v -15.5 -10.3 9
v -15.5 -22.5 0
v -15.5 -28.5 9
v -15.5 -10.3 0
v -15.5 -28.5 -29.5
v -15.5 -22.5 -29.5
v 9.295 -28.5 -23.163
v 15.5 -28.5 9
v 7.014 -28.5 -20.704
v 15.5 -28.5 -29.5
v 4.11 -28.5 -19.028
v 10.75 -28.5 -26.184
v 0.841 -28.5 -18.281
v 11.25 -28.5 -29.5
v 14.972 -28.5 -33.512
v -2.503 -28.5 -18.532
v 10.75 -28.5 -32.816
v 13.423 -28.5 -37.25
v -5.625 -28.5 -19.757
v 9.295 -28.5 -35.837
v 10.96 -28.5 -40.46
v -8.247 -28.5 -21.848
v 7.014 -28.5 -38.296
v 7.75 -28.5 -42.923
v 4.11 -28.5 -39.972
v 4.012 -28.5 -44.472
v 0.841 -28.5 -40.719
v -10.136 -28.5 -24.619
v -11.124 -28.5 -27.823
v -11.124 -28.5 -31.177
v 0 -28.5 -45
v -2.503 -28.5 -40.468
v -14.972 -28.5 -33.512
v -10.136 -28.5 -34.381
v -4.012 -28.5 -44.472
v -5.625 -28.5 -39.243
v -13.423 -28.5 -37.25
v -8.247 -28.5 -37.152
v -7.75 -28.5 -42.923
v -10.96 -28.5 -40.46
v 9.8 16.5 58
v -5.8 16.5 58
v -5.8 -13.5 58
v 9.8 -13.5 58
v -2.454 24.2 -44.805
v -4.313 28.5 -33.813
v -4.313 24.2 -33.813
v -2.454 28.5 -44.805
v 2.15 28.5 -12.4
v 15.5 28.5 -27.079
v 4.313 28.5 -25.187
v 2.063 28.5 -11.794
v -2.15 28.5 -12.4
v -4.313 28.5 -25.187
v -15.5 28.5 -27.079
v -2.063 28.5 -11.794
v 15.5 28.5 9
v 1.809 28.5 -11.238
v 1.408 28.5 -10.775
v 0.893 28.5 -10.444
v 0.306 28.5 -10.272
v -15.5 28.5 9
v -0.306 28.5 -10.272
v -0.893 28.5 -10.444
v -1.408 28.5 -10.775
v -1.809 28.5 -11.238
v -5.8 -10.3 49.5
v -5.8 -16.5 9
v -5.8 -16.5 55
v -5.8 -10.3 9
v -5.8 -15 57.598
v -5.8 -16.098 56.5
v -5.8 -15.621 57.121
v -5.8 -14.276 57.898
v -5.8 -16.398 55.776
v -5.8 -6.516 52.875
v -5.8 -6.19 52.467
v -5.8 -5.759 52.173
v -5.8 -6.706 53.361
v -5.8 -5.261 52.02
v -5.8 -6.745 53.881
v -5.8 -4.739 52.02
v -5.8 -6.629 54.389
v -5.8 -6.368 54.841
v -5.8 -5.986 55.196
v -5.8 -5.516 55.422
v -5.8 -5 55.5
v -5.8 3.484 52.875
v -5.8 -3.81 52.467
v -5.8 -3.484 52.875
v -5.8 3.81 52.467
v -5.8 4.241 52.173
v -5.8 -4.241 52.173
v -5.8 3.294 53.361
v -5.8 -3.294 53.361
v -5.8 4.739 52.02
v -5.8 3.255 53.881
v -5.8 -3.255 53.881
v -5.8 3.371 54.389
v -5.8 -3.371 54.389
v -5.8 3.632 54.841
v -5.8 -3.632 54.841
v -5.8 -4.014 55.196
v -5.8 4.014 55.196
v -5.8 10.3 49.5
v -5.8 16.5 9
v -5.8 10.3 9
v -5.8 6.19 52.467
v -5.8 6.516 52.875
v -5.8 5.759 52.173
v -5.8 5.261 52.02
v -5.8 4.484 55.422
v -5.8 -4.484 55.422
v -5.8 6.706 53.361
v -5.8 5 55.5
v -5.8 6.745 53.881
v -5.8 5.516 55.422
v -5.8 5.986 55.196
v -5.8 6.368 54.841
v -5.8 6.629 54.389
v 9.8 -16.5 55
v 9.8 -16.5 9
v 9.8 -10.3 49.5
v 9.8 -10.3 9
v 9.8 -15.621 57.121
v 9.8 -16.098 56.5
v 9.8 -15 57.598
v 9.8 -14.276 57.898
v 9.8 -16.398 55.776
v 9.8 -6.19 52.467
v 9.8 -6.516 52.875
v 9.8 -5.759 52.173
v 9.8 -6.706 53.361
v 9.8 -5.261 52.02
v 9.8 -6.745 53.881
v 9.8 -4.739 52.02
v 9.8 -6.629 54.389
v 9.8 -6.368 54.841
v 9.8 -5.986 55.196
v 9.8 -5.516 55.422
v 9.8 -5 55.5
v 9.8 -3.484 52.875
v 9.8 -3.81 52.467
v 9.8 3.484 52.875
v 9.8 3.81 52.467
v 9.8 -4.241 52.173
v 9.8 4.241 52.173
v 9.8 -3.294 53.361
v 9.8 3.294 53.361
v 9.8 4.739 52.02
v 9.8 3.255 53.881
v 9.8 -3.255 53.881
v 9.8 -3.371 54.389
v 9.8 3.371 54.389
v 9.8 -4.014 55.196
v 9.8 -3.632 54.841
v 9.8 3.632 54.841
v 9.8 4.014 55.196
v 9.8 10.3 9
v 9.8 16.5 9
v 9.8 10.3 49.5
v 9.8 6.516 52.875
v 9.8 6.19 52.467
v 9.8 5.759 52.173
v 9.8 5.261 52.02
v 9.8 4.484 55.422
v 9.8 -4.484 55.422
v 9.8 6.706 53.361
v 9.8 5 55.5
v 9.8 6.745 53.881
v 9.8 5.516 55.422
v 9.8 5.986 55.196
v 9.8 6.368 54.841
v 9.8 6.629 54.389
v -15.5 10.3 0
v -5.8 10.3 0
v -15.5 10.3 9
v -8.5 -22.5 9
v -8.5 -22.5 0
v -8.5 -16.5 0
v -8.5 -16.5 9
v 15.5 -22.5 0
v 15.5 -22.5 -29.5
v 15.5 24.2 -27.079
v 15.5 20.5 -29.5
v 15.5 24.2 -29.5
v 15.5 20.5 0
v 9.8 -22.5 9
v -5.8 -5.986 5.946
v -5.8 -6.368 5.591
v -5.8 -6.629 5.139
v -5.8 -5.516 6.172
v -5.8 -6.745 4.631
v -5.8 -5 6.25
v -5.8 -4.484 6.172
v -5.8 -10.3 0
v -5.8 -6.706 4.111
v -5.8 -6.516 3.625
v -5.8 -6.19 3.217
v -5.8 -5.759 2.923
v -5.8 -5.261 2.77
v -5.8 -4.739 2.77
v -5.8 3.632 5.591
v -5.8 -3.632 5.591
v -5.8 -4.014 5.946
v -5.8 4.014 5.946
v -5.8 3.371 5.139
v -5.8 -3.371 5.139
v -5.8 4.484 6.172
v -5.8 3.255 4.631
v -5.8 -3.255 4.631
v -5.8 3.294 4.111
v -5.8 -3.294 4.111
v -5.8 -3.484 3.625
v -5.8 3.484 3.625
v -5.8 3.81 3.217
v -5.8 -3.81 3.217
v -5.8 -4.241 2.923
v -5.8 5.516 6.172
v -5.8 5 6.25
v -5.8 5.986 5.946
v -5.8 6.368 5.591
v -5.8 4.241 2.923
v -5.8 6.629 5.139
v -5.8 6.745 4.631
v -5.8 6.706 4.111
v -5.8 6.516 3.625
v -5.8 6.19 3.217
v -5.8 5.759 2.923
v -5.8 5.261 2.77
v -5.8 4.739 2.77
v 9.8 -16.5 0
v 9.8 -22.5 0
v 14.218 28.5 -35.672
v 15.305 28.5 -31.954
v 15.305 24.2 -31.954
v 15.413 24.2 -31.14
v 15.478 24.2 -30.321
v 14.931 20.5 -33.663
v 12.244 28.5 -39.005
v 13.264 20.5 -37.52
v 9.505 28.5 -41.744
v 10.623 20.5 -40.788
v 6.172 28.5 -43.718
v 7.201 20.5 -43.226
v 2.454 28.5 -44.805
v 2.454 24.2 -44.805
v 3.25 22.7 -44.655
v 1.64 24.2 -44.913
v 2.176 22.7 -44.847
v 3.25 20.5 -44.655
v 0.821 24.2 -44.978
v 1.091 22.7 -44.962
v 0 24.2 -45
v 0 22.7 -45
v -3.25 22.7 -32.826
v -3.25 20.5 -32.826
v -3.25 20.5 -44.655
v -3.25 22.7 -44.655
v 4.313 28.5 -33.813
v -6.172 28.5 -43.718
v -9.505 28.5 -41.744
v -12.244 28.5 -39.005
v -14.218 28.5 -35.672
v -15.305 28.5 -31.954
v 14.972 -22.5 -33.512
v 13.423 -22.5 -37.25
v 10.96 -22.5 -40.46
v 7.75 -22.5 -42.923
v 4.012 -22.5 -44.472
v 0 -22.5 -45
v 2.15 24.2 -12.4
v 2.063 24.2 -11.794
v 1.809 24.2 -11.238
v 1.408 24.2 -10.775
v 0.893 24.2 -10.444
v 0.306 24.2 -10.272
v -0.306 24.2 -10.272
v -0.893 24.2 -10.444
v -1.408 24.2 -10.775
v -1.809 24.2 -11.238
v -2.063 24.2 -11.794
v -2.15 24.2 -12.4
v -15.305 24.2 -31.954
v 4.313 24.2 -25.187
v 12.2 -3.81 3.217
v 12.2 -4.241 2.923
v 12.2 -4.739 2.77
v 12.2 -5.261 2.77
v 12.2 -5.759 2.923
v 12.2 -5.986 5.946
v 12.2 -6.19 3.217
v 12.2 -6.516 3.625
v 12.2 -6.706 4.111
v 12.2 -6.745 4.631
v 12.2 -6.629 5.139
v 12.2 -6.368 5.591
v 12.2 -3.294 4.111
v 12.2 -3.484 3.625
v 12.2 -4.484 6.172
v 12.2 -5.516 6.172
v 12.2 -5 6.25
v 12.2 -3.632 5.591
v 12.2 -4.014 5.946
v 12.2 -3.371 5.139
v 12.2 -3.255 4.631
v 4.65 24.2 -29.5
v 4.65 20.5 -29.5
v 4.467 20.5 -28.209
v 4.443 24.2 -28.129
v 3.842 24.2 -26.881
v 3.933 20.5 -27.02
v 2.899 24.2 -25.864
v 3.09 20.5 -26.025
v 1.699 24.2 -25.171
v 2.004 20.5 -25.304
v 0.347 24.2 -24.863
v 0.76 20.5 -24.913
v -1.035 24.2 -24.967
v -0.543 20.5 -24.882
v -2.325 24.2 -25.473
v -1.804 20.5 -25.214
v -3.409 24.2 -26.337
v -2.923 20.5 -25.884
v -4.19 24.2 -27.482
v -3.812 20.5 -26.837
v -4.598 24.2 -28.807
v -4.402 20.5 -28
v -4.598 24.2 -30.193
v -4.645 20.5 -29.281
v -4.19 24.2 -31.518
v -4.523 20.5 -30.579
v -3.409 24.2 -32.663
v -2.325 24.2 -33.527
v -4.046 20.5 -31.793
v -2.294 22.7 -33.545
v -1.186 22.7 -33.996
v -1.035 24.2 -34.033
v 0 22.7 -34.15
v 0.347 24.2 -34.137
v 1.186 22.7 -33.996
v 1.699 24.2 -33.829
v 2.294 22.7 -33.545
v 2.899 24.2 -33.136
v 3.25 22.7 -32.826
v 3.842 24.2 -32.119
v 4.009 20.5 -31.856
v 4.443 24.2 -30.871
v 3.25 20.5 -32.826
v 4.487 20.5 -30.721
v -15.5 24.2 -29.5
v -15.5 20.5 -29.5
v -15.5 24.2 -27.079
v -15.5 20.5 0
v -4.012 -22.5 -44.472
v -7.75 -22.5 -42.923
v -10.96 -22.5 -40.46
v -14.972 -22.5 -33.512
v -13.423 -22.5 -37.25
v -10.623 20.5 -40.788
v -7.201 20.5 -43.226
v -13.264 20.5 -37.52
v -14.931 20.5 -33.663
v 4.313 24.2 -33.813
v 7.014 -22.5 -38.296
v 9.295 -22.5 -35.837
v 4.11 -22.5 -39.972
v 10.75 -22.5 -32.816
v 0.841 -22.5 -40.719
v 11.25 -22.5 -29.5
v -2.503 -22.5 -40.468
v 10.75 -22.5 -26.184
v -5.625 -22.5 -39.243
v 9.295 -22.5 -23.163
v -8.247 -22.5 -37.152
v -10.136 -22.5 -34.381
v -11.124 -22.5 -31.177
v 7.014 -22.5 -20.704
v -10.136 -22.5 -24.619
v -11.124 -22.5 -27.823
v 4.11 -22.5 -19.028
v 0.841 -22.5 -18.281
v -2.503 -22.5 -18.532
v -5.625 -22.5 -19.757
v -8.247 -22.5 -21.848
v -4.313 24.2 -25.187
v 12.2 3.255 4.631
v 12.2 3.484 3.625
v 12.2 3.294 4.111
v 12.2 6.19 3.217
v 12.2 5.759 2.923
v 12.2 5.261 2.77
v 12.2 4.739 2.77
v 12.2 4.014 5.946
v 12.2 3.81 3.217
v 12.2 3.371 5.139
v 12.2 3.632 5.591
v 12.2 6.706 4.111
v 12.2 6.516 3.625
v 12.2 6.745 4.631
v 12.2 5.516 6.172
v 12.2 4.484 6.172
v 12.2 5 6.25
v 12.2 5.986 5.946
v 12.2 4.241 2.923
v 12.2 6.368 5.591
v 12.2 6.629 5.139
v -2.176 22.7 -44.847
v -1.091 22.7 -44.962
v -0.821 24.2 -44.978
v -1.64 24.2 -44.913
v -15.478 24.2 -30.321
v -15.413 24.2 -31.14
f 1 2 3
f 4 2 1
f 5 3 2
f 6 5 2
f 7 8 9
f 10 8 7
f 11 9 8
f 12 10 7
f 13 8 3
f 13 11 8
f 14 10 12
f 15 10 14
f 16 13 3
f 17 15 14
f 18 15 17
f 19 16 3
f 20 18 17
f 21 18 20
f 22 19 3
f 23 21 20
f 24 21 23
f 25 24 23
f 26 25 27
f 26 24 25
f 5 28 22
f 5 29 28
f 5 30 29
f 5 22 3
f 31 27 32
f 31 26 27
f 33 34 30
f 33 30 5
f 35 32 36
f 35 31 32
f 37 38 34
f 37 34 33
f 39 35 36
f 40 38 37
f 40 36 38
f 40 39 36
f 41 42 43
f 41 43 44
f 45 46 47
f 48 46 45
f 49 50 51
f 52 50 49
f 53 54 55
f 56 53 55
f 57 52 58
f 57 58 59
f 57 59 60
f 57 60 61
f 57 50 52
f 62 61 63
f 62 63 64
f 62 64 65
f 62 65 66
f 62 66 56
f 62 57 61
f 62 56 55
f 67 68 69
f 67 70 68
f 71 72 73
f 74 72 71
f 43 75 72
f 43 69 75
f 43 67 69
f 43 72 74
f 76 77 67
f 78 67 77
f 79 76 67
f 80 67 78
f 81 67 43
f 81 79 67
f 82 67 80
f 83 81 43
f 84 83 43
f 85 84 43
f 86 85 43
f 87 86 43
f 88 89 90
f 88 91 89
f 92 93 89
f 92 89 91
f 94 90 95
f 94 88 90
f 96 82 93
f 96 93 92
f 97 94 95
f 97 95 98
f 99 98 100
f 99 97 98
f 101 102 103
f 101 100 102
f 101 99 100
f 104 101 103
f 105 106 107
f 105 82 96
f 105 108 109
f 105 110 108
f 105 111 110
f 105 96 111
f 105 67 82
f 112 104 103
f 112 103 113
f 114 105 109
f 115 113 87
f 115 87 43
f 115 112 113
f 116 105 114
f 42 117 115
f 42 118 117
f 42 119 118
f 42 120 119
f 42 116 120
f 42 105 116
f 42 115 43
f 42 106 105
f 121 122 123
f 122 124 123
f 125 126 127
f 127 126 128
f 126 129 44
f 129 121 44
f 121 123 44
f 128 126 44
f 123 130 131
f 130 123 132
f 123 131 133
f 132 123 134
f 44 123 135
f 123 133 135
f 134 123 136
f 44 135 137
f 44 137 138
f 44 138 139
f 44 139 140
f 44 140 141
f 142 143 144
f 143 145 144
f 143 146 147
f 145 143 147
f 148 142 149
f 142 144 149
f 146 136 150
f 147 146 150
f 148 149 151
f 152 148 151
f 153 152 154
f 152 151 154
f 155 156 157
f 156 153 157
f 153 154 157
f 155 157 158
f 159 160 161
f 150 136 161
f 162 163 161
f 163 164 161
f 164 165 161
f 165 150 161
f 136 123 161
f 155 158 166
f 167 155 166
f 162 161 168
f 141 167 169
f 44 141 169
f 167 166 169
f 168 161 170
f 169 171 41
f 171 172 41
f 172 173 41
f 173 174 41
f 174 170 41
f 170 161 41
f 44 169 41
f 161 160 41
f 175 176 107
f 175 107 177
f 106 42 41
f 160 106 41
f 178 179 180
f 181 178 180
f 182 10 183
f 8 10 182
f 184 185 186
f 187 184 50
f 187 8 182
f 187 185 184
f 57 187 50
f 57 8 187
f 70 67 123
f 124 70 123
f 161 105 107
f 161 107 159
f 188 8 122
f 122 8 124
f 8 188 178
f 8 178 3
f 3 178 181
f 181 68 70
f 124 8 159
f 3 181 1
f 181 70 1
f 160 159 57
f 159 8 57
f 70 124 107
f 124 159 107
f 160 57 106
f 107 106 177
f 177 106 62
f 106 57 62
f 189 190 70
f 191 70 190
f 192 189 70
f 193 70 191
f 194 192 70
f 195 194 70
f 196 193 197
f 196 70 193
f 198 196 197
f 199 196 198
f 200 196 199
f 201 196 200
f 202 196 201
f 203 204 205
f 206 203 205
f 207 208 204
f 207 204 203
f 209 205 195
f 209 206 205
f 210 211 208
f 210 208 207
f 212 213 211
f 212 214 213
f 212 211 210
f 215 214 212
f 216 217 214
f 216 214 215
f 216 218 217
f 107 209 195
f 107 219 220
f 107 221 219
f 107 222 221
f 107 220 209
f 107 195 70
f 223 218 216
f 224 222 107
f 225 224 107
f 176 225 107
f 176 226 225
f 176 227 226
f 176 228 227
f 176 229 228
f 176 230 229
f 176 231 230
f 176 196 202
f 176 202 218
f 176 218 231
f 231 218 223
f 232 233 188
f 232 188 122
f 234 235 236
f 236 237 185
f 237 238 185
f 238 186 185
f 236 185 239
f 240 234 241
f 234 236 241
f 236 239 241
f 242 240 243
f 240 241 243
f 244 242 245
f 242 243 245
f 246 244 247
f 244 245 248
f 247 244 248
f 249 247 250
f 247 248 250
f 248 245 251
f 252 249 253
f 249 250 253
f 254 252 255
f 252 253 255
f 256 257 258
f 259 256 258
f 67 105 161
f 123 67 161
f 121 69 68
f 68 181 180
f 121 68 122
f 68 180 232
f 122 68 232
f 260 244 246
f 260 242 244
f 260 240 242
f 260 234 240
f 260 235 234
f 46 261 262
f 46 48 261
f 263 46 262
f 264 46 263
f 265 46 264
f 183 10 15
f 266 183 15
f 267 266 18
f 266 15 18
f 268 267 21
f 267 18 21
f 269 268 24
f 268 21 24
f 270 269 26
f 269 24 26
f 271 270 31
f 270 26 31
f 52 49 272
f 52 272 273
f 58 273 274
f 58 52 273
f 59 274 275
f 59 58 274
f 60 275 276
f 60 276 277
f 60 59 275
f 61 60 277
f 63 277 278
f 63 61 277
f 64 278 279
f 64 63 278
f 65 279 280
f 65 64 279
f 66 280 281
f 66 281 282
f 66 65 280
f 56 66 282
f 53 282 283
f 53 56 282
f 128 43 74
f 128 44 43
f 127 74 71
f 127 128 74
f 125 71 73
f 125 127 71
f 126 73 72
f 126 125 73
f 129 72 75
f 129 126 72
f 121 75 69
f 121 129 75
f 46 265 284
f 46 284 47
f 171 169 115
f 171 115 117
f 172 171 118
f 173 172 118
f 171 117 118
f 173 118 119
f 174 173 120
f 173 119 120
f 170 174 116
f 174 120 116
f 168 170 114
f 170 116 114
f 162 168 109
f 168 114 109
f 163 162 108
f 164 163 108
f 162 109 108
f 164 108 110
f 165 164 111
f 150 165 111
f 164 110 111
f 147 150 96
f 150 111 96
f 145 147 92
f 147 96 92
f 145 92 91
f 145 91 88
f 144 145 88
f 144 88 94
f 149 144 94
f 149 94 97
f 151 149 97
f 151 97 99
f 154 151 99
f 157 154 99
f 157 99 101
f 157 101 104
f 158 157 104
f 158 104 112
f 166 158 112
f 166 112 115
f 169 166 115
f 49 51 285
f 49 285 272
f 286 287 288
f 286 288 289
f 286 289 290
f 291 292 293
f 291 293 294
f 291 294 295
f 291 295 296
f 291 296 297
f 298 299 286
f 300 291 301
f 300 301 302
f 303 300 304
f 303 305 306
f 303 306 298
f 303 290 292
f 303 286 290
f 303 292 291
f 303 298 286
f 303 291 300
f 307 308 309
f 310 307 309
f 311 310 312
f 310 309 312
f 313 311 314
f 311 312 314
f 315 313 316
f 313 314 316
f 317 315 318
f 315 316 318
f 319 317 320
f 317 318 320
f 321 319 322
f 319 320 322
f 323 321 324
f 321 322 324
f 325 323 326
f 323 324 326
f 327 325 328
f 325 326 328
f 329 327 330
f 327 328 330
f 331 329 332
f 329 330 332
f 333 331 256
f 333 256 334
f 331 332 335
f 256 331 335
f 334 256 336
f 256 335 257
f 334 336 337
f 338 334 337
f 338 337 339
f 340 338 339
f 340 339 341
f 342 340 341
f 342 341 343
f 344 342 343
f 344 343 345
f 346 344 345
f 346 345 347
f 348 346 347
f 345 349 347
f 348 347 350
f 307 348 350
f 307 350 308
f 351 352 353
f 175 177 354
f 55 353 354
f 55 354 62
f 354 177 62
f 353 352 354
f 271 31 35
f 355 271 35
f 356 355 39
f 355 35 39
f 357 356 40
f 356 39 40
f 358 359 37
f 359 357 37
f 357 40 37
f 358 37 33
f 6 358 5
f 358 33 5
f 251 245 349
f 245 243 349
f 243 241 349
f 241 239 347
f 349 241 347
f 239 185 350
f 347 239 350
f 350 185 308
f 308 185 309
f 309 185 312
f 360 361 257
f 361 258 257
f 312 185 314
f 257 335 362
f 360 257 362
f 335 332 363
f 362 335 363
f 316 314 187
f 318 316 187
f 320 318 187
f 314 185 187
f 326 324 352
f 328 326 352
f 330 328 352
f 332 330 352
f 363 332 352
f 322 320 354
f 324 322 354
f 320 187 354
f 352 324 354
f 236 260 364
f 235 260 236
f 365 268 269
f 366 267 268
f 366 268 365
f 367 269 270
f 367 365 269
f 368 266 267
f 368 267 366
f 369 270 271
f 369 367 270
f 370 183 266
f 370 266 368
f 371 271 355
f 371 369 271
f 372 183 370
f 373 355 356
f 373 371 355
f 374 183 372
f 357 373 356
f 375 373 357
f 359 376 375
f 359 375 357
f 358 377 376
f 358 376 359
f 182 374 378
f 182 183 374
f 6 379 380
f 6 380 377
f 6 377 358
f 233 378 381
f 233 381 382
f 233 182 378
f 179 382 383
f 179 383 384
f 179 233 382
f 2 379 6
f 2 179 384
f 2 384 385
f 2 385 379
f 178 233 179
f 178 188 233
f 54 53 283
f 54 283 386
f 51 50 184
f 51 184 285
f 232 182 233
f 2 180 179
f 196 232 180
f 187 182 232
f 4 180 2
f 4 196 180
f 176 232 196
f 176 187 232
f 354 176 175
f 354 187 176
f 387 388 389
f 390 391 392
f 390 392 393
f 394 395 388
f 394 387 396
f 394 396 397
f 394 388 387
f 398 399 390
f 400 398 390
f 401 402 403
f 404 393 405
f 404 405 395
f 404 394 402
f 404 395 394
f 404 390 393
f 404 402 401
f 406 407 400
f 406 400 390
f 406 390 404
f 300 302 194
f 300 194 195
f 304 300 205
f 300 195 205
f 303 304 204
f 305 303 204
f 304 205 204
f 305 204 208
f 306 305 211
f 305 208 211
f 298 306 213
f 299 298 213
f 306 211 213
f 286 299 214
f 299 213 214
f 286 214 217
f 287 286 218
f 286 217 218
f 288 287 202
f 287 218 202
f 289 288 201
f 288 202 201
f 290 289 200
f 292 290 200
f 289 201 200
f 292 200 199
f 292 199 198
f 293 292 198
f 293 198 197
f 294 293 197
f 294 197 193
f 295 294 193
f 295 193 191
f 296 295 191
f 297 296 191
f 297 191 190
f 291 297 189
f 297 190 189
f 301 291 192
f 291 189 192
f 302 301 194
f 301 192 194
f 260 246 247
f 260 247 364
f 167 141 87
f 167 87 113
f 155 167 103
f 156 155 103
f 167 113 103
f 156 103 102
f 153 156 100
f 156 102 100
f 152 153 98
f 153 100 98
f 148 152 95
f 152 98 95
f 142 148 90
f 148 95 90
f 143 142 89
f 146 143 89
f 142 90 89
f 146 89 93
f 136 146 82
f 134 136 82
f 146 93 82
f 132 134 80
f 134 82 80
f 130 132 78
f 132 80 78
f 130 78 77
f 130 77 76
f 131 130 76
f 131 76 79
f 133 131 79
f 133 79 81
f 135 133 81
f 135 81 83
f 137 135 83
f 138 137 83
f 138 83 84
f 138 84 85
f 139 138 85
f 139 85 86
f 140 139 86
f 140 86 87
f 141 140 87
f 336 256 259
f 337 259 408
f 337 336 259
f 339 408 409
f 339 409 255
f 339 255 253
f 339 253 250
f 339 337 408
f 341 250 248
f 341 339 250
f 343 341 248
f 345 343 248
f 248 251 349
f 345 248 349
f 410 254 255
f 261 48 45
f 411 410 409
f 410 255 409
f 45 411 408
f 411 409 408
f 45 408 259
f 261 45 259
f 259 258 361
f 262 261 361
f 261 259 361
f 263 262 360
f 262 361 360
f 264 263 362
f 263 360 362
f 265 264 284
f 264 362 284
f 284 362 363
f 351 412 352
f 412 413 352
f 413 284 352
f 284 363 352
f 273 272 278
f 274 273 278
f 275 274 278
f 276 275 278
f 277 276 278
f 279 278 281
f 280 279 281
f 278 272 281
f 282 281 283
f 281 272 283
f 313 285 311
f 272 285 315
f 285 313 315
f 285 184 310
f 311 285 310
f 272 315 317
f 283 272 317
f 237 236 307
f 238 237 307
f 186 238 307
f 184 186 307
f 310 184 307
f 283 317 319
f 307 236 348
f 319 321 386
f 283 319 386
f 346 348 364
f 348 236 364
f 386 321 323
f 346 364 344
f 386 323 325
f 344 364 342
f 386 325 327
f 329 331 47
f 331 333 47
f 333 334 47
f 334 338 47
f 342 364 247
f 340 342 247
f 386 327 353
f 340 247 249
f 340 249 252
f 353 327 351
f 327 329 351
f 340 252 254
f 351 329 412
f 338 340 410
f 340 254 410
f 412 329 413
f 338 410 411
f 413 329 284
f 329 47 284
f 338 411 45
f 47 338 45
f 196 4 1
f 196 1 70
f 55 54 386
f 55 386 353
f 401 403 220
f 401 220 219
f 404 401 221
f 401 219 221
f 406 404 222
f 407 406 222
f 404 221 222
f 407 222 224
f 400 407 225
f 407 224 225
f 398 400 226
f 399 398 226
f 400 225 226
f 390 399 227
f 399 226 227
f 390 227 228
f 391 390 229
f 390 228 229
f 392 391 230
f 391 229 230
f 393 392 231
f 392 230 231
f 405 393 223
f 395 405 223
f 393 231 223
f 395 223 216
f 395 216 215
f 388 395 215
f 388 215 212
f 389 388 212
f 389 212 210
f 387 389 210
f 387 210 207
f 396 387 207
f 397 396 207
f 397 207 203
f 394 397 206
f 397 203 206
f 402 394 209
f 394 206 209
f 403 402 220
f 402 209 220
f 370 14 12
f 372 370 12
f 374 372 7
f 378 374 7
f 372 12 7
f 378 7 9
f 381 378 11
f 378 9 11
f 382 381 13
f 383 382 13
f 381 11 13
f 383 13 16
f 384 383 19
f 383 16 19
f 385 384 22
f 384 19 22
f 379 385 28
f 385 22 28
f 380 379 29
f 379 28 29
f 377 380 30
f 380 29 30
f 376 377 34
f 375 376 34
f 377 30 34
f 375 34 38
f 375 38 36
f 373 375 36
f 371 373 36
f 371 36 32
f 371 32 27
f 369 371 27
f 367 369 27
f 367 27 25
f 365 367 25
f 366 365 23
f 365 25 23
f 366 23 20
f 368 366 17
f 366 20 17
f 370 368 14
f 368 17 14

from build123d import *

# Parameters (mm, degrees)
SKETCH1_W           = 18.3
SKETCH1_H           = 6
BOSS_EXTRUDE1_DEPTH = 9
SKETCH2_W           = 15.6
SKETCH2_H           = 6.2
BOSS_EXTRUDE2_DEPTH = 49
SKETCH3_W           = 15.6
SKETCH3_H           = 8.5
BOSS_EXTRUDE3_DEPTH = 20.7
FILLET3_R           = 3
SKETCH4_W           = 31
SKETCH4_H           = 8
SKETCH4_H_2         = 6
BOSS_EXTRUDE4_DEPTH = 45
CUT_EXTRUDE1_DEPTH  = 58
SKETCH6_3_R         = 11.25
CUT_EXTRUDE2_DEPTH  = 6
CUT_EXTRUDE3_DEPTH  = 4.3
CUT_EXTRUDE4_DEPTH  = 2.2
SKETCH9_3_R         = 4.65
CUT_EXTRUDE5_DEPTH  = 8
SKETCH10_R          = 1.75
CUT_EXTRUDE6_DEPTH  = 18


with BuildPart() as part:
    # Sketch1 → Boss-Extrude1 (new body)
    with BuildSketch(Plane.XY):
        Polygon((15.5, -28.5), (-15.5, -28.5), (-15.5, -10.3), (-5.8, -10.3), (-5.8, 10.3), (-15.5, 10.3), (-15.5, 28.5), (15.5, 28.5), align=None)
        with Locations((0.65, -19.5)):
            Rectangle(SKETCH1_W, SKETCH1_H, mode=Mode.SUBTRACT)
    extrude(amount=BOSS_EXTRUDE1_DEPTH)

    # Sketch2 → Boss-Extrude2 (add)
    with BuildSketch(Plane.XY.offset(9)):
        with Locations((2, -13.4)):
            Rectangle(SKETCH2_W, SKETCH2_H)
        with Locations((2, 13.4)):
            Rectangle(SKETCH2_W, SKETCH2_H)
    extrude(amount=BOSS_EXTRUDE2_DEPTH)

    # Sketch3 → Boss-Extrude3 (add)
    with BuildSketch(Plane.XZ.offset(-10.3)):
        with Locations((2, 53.75)):
            Rectangle(SKETCH3_W, SKETCH3_H)
    extrude(amount=BOSS_EXTRUDE3_DEPTH)

    # Fillet3
    fillet3_edges = [part.edges().sort_by_distance(p)[0] for p in [
        (2, -16.5, 58),
    ]]
    fillet(fillet3_edges, radius=FILLET3_R)

    # Sketch4 → Boss-Extrude4 (add)
    with BuildSketch(Plane(origin=(0, 0, 0), x_dir=(-1, 0, 0), z_dir=(0, 0, -1))):
        with Locations((0, 24.5)):
            Rectangle(SKETCH4_W, SKETCH4_H)
        with Locations((0, -25.5)):
            Rectangle(SKETCH4_W, SKETCH4_H_2)
    extrude(amount=BOSS_EXTRUDE4_DEPTH)

    # Sketch6 → Cut-Extrude1 (cut, through all)
    with BuildSketch(Plane.XZ.offset(28.5)):
        with BuildLine():
            ThreePointArc((15.5, -29.5), (10.960155101, -40.460155116), (-2.1e-08, -45))
            Line((-2.1e-08, -45), (15.5, -45))
            Line((15.5, -45), (15.5, -29.5))
        make_face()
        with BuildLine():
            ThreePointArc((-2.1e-08, -45), (-10.960155116, -40.460155101), (-15.5, -29.5))
            Line((-15.5, -29.5), (-15.5, -45))
            Line((-15.5, -45), (-2.1e-08, -45))
        make_face()
    extrude(amount=-CUT_EXTRUDE1_DEPTH, mode=Mode.SUBTRACT)

    # Sketch6<3> → Cut-Extrude2 (cut)
    with BuildSketch(Plane.XZ.offset(28.5)):
        with Locations((0, -29.5)):
            Circle(SKETCH6_3_R)
    extrude(amount=-CUT_EXTRUDE2_DEPTH, mode=Mode.SUBTRACT)

    # Sketch7 → Cut-Extrude3 (cut)
    with BuildSketch(Plane(origin=(0, 28.5, 0), x_dir=(1, 0, 0), z_dir=(0, 1, 0))):
        with BuildLine():
            Line((-17.1, 31.65), (-4.313351365, 33.813351365))
            Line((-4.313351365, 33.813351365), (-2.15, 46.6))
            ThreePointArc((-2.15, 46.6), (0, 48.75), (2.15, 46.6))
            Line((2.15, 46.6), (4.313351365, 33.813351365))
            Line((4.313351365, 33.813351365), (17.1, 31.65))
            ThreePointArc((17.1, 31.65), (19.25, 29.5), (17.1, 27.35))
            Line((17.1, 27.35), (4.313351365, 25.186648635))
            Line((4.313351365, 25.186648635), (2.15, 12.4))
            ThreePointArc((2.15, 12.4), (0, 10.25), (-2.15, 12.4))
            Line((-2.15, 12.4), (-4.313351365, 25.186648635))
            Line((-4.313351365, 25.186648635), (-17.1, 27.35))
            ThreePointArc((-17.1, 27.35), (-19.25, 29.5), (-17.1, 31.65))
        make_face()
    extrude(amount=-CUT_EXTRUDE3_DEPTH, mode=Mode.SUBTRACT)

    # Sketch9 → Cut-Extrude4 (cut)
    with BuildSketch(Plane.XZ.offset(-20.5)):
        with BuildLine():
            ThreePointArc((3.25, -32.82565783), (0, -34.15), (-3.25, -32.82565783))
            Line((-3.25, -32.82565783), (-3.25, -44.655444566))
            ThreePointArc((-3.25, -44.655444566), (0, -45), (3.25, -44.655444566))
            Line((3.25, -44.655444566), (3.25, -32.82565783))
        make_face()
    extrude(amount=-CUT_EXTRUDE4_DEPTH, mode=Mode.SUBTRACT)

    # Sketch9<3> → Cut-Extrude5 (cut)
    with BuildSketch(Plane.XZ.offset(-20.5)):
        with Locations((0, -29.5)):
            Circle(SKETCH9_3_R)
    extrude(amount=-CUT_EXTRUDE5_DEPTH, mode=Mode.SUBTRACT)

    # Sketch10 → Cut-Extrude6 (cut)
    with BuildSketch(Plane.ZY.offset(5.8)):
        with Locations((4.5, 5)):
            Circle(SKETCH10_R)
        with Locations((4.5, -5)):
            Circle(SKETCH10_R)
        with Locations((53.75, 5)):
            Circle(SKETCH10_R)
        with Locations((53.75, -5)):
            Circle(SKETCH10_R)
    extrude(amount=-CUT_EXTRUDE6_DEPTH, mode=Mode.SUBTRACT)


solid = part.part
